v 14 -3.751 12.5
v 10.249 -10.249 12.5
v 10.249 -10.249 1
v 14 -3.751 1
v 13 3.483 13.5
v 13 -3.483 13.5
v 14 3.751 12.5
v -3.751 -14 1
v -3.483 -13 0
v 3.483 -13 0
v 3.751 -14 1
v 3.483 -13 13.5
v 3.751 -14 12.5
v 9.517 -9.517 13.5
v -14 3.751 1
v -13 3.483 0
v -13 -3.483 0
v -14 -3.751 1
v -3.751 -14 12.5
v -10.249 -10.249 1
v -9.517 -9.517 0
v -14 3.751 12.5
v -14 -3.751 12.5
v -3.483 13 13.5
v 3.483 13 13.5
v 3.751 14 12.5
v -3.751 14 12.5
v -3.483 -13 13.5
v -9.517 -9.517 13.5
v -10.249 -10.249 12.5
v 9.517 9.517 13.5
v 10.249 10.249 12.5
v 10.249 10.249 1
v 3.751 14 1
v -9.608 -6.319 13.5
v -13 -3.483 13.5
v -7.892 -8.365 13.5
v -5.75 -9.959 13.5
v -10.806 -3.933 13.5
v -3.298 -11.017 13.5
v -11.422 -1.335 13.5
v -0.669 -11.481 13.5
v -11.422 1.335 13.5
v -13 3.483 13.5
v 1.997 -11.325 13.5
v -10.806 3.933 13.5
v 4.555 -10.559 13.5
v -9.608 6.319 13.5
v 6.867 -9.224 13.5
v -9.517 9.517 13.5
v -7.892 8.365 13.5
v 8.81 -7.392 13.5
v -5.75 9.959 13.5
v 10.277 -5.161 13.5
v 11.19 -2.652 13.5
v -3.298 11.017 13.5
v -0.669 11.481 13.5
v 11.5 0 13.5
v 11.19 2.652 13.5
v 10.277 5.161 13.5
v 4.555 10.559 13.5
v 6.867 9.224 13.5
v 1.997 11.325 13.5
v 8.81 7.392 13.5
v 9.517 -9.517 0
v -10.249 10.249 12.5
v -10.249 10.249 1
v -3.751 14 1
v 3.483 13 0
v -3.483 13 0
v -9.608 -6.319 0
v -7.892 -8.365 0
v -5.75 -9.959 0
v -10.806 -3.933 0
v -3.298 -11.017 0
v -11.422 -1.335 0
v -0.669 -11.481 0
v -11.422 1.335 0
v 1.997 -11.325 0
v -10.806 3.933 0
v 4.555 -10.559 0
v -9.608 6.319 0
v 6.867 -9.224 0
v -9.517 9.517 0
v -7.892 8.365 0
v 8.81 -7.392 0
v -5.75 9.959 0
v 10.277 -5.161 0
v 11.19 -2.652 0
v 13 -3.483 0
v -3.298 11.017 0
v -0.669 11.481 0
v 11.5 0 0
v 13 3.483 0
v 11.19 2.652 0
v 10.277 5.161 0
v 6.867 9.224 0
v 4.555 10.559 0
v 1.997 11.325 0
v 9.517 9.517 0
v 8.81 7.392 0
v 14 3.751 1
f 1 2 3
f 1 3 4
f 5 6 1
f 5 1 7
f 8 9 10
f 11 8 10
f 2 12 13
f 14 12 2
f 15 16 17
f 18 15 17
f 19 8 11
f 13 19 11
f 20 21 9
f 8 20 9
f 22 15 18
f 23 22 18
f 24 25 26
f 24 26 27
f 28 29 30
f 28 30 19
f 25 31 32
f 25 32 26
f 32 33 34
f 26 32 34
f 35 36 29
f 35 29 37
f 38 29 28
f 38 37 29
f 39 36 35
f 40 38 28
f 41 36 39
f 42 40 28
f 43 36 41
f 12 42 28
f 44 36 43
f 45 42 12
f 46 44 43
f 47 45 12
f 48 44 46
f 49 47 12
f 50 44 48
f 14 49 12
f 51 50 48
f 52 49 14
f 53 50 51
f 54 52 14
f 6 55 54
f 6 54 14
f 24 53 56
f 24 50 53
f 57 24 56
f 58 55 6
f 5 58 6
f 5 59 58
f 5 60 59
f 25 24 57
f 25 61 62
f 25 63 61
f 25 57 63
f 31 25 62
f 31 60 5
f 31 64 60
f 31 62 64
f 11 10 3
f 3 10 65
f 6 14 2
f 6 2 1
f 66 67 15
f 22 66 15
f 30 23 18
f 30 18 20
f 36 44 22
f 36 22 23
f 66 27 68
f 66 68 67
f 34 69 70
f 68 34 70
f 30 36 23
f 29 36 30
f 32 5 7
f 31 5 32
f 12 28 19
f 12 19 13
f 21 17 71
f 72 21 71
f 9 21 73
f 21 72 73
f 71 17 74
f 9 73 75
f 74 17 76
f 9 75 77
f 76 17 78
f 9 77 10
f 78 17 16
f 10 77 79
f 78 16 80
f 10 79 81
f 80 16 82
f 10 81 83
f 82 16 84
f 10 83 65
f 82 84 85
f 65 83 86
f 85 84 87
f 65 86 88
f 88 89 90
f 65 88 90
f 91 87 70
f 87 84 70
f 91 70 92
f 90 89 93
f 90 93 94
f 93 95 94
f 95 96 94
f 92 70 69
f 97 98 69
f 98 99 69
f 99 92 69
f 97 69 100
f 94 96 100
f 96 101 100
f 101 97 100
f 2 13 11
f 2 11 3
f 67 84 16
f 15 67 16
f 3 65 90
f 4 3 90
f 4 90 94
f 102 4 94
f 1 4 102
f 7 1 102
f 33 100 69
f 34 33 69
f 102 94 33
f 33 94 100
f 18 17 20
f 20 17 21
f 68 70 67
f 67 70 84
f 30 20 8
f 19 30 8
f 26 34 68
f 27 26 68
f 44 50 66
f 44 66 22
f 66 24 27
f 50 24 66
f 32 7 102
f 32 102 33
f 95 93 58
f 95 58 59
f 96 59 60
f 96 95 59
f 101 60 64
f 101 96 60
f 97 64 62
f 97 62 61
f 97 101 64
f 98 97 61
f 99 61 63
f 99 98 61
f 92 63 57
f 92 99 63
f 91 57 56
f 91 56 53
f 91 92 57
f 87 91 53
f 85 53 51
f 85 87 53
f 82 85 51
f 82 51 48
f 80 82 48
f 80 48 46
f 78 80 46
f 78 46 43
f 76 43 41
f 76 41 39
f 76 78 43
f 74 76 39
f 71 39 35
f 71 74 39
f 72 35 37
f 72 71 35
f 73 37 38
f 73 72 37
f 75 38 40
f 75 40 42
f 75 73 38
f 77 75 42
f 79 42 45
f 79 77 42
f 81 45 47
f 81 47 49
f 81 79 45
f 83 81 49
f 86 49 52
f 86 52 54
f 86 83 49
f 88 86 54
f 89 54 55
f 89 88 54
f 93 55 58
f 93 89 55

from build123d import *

# Parameters (mm, degrees)
F0_R     = 11.5
F1_DEPTH = 13.5
F2_SIZE  = 1


with BuildPart() as f1:
    # F0 (on Top) → F1 (new body)
    with BuildSketch(Plane.XY):
        Polygon((14, -3.751289), (14, 3.751289), (10.248711, 10.248711), (3.751289, 14), (-3.751289, 14), (-10.248711, 10.248711), (-14, 3.751289), (-14, -3.751289), (-10.248711, -10.248711), (-3.751289, -14), (3.751289, -14), (10.248711, -10.248711), align=None)
        Circle(F0_R, mode=Mode.SUBTRACT)
    extrude(amount=F1_DEPTH)

    # F2
    f2_edges = [f1.edges().sort_by_distance(p)[0] for p in [
        (7, -12.124356, 13.5),
        (14, 0, 13.5),
        (12.124356, 7, 13.5),
        (7, 12.124356, 13.5),
        (0, 14, 13.5),
        (-7, 12.124356, 13.5),
        (-12.124356, 7, 13.5),
        (-14, 0, 13.5),
        (-12.124356, -7, 13.5),
        (-7, -12.124356, 13.5),
        (0, -14, 13.5),
        (14, 0, 0),
        (12.124356, 7, 0),
        (7, 12.124356, 0),
        (0, 14, 0),
        (-7, 12.124356, 0),
        (-12.124356, 7, 0),
        (-14, 0, 0),
        (-12.124356, -7, 0),
        (-7, -12.124356, 0),
        (0, -14, 0),
        (7, -12.124356, 0),
        (12.124356, -7, 0),
        (12.124356, -7, 13.5),
    ]]
    chamfer(f2_edges, length=F2_SIZE)


solid = f1.part
